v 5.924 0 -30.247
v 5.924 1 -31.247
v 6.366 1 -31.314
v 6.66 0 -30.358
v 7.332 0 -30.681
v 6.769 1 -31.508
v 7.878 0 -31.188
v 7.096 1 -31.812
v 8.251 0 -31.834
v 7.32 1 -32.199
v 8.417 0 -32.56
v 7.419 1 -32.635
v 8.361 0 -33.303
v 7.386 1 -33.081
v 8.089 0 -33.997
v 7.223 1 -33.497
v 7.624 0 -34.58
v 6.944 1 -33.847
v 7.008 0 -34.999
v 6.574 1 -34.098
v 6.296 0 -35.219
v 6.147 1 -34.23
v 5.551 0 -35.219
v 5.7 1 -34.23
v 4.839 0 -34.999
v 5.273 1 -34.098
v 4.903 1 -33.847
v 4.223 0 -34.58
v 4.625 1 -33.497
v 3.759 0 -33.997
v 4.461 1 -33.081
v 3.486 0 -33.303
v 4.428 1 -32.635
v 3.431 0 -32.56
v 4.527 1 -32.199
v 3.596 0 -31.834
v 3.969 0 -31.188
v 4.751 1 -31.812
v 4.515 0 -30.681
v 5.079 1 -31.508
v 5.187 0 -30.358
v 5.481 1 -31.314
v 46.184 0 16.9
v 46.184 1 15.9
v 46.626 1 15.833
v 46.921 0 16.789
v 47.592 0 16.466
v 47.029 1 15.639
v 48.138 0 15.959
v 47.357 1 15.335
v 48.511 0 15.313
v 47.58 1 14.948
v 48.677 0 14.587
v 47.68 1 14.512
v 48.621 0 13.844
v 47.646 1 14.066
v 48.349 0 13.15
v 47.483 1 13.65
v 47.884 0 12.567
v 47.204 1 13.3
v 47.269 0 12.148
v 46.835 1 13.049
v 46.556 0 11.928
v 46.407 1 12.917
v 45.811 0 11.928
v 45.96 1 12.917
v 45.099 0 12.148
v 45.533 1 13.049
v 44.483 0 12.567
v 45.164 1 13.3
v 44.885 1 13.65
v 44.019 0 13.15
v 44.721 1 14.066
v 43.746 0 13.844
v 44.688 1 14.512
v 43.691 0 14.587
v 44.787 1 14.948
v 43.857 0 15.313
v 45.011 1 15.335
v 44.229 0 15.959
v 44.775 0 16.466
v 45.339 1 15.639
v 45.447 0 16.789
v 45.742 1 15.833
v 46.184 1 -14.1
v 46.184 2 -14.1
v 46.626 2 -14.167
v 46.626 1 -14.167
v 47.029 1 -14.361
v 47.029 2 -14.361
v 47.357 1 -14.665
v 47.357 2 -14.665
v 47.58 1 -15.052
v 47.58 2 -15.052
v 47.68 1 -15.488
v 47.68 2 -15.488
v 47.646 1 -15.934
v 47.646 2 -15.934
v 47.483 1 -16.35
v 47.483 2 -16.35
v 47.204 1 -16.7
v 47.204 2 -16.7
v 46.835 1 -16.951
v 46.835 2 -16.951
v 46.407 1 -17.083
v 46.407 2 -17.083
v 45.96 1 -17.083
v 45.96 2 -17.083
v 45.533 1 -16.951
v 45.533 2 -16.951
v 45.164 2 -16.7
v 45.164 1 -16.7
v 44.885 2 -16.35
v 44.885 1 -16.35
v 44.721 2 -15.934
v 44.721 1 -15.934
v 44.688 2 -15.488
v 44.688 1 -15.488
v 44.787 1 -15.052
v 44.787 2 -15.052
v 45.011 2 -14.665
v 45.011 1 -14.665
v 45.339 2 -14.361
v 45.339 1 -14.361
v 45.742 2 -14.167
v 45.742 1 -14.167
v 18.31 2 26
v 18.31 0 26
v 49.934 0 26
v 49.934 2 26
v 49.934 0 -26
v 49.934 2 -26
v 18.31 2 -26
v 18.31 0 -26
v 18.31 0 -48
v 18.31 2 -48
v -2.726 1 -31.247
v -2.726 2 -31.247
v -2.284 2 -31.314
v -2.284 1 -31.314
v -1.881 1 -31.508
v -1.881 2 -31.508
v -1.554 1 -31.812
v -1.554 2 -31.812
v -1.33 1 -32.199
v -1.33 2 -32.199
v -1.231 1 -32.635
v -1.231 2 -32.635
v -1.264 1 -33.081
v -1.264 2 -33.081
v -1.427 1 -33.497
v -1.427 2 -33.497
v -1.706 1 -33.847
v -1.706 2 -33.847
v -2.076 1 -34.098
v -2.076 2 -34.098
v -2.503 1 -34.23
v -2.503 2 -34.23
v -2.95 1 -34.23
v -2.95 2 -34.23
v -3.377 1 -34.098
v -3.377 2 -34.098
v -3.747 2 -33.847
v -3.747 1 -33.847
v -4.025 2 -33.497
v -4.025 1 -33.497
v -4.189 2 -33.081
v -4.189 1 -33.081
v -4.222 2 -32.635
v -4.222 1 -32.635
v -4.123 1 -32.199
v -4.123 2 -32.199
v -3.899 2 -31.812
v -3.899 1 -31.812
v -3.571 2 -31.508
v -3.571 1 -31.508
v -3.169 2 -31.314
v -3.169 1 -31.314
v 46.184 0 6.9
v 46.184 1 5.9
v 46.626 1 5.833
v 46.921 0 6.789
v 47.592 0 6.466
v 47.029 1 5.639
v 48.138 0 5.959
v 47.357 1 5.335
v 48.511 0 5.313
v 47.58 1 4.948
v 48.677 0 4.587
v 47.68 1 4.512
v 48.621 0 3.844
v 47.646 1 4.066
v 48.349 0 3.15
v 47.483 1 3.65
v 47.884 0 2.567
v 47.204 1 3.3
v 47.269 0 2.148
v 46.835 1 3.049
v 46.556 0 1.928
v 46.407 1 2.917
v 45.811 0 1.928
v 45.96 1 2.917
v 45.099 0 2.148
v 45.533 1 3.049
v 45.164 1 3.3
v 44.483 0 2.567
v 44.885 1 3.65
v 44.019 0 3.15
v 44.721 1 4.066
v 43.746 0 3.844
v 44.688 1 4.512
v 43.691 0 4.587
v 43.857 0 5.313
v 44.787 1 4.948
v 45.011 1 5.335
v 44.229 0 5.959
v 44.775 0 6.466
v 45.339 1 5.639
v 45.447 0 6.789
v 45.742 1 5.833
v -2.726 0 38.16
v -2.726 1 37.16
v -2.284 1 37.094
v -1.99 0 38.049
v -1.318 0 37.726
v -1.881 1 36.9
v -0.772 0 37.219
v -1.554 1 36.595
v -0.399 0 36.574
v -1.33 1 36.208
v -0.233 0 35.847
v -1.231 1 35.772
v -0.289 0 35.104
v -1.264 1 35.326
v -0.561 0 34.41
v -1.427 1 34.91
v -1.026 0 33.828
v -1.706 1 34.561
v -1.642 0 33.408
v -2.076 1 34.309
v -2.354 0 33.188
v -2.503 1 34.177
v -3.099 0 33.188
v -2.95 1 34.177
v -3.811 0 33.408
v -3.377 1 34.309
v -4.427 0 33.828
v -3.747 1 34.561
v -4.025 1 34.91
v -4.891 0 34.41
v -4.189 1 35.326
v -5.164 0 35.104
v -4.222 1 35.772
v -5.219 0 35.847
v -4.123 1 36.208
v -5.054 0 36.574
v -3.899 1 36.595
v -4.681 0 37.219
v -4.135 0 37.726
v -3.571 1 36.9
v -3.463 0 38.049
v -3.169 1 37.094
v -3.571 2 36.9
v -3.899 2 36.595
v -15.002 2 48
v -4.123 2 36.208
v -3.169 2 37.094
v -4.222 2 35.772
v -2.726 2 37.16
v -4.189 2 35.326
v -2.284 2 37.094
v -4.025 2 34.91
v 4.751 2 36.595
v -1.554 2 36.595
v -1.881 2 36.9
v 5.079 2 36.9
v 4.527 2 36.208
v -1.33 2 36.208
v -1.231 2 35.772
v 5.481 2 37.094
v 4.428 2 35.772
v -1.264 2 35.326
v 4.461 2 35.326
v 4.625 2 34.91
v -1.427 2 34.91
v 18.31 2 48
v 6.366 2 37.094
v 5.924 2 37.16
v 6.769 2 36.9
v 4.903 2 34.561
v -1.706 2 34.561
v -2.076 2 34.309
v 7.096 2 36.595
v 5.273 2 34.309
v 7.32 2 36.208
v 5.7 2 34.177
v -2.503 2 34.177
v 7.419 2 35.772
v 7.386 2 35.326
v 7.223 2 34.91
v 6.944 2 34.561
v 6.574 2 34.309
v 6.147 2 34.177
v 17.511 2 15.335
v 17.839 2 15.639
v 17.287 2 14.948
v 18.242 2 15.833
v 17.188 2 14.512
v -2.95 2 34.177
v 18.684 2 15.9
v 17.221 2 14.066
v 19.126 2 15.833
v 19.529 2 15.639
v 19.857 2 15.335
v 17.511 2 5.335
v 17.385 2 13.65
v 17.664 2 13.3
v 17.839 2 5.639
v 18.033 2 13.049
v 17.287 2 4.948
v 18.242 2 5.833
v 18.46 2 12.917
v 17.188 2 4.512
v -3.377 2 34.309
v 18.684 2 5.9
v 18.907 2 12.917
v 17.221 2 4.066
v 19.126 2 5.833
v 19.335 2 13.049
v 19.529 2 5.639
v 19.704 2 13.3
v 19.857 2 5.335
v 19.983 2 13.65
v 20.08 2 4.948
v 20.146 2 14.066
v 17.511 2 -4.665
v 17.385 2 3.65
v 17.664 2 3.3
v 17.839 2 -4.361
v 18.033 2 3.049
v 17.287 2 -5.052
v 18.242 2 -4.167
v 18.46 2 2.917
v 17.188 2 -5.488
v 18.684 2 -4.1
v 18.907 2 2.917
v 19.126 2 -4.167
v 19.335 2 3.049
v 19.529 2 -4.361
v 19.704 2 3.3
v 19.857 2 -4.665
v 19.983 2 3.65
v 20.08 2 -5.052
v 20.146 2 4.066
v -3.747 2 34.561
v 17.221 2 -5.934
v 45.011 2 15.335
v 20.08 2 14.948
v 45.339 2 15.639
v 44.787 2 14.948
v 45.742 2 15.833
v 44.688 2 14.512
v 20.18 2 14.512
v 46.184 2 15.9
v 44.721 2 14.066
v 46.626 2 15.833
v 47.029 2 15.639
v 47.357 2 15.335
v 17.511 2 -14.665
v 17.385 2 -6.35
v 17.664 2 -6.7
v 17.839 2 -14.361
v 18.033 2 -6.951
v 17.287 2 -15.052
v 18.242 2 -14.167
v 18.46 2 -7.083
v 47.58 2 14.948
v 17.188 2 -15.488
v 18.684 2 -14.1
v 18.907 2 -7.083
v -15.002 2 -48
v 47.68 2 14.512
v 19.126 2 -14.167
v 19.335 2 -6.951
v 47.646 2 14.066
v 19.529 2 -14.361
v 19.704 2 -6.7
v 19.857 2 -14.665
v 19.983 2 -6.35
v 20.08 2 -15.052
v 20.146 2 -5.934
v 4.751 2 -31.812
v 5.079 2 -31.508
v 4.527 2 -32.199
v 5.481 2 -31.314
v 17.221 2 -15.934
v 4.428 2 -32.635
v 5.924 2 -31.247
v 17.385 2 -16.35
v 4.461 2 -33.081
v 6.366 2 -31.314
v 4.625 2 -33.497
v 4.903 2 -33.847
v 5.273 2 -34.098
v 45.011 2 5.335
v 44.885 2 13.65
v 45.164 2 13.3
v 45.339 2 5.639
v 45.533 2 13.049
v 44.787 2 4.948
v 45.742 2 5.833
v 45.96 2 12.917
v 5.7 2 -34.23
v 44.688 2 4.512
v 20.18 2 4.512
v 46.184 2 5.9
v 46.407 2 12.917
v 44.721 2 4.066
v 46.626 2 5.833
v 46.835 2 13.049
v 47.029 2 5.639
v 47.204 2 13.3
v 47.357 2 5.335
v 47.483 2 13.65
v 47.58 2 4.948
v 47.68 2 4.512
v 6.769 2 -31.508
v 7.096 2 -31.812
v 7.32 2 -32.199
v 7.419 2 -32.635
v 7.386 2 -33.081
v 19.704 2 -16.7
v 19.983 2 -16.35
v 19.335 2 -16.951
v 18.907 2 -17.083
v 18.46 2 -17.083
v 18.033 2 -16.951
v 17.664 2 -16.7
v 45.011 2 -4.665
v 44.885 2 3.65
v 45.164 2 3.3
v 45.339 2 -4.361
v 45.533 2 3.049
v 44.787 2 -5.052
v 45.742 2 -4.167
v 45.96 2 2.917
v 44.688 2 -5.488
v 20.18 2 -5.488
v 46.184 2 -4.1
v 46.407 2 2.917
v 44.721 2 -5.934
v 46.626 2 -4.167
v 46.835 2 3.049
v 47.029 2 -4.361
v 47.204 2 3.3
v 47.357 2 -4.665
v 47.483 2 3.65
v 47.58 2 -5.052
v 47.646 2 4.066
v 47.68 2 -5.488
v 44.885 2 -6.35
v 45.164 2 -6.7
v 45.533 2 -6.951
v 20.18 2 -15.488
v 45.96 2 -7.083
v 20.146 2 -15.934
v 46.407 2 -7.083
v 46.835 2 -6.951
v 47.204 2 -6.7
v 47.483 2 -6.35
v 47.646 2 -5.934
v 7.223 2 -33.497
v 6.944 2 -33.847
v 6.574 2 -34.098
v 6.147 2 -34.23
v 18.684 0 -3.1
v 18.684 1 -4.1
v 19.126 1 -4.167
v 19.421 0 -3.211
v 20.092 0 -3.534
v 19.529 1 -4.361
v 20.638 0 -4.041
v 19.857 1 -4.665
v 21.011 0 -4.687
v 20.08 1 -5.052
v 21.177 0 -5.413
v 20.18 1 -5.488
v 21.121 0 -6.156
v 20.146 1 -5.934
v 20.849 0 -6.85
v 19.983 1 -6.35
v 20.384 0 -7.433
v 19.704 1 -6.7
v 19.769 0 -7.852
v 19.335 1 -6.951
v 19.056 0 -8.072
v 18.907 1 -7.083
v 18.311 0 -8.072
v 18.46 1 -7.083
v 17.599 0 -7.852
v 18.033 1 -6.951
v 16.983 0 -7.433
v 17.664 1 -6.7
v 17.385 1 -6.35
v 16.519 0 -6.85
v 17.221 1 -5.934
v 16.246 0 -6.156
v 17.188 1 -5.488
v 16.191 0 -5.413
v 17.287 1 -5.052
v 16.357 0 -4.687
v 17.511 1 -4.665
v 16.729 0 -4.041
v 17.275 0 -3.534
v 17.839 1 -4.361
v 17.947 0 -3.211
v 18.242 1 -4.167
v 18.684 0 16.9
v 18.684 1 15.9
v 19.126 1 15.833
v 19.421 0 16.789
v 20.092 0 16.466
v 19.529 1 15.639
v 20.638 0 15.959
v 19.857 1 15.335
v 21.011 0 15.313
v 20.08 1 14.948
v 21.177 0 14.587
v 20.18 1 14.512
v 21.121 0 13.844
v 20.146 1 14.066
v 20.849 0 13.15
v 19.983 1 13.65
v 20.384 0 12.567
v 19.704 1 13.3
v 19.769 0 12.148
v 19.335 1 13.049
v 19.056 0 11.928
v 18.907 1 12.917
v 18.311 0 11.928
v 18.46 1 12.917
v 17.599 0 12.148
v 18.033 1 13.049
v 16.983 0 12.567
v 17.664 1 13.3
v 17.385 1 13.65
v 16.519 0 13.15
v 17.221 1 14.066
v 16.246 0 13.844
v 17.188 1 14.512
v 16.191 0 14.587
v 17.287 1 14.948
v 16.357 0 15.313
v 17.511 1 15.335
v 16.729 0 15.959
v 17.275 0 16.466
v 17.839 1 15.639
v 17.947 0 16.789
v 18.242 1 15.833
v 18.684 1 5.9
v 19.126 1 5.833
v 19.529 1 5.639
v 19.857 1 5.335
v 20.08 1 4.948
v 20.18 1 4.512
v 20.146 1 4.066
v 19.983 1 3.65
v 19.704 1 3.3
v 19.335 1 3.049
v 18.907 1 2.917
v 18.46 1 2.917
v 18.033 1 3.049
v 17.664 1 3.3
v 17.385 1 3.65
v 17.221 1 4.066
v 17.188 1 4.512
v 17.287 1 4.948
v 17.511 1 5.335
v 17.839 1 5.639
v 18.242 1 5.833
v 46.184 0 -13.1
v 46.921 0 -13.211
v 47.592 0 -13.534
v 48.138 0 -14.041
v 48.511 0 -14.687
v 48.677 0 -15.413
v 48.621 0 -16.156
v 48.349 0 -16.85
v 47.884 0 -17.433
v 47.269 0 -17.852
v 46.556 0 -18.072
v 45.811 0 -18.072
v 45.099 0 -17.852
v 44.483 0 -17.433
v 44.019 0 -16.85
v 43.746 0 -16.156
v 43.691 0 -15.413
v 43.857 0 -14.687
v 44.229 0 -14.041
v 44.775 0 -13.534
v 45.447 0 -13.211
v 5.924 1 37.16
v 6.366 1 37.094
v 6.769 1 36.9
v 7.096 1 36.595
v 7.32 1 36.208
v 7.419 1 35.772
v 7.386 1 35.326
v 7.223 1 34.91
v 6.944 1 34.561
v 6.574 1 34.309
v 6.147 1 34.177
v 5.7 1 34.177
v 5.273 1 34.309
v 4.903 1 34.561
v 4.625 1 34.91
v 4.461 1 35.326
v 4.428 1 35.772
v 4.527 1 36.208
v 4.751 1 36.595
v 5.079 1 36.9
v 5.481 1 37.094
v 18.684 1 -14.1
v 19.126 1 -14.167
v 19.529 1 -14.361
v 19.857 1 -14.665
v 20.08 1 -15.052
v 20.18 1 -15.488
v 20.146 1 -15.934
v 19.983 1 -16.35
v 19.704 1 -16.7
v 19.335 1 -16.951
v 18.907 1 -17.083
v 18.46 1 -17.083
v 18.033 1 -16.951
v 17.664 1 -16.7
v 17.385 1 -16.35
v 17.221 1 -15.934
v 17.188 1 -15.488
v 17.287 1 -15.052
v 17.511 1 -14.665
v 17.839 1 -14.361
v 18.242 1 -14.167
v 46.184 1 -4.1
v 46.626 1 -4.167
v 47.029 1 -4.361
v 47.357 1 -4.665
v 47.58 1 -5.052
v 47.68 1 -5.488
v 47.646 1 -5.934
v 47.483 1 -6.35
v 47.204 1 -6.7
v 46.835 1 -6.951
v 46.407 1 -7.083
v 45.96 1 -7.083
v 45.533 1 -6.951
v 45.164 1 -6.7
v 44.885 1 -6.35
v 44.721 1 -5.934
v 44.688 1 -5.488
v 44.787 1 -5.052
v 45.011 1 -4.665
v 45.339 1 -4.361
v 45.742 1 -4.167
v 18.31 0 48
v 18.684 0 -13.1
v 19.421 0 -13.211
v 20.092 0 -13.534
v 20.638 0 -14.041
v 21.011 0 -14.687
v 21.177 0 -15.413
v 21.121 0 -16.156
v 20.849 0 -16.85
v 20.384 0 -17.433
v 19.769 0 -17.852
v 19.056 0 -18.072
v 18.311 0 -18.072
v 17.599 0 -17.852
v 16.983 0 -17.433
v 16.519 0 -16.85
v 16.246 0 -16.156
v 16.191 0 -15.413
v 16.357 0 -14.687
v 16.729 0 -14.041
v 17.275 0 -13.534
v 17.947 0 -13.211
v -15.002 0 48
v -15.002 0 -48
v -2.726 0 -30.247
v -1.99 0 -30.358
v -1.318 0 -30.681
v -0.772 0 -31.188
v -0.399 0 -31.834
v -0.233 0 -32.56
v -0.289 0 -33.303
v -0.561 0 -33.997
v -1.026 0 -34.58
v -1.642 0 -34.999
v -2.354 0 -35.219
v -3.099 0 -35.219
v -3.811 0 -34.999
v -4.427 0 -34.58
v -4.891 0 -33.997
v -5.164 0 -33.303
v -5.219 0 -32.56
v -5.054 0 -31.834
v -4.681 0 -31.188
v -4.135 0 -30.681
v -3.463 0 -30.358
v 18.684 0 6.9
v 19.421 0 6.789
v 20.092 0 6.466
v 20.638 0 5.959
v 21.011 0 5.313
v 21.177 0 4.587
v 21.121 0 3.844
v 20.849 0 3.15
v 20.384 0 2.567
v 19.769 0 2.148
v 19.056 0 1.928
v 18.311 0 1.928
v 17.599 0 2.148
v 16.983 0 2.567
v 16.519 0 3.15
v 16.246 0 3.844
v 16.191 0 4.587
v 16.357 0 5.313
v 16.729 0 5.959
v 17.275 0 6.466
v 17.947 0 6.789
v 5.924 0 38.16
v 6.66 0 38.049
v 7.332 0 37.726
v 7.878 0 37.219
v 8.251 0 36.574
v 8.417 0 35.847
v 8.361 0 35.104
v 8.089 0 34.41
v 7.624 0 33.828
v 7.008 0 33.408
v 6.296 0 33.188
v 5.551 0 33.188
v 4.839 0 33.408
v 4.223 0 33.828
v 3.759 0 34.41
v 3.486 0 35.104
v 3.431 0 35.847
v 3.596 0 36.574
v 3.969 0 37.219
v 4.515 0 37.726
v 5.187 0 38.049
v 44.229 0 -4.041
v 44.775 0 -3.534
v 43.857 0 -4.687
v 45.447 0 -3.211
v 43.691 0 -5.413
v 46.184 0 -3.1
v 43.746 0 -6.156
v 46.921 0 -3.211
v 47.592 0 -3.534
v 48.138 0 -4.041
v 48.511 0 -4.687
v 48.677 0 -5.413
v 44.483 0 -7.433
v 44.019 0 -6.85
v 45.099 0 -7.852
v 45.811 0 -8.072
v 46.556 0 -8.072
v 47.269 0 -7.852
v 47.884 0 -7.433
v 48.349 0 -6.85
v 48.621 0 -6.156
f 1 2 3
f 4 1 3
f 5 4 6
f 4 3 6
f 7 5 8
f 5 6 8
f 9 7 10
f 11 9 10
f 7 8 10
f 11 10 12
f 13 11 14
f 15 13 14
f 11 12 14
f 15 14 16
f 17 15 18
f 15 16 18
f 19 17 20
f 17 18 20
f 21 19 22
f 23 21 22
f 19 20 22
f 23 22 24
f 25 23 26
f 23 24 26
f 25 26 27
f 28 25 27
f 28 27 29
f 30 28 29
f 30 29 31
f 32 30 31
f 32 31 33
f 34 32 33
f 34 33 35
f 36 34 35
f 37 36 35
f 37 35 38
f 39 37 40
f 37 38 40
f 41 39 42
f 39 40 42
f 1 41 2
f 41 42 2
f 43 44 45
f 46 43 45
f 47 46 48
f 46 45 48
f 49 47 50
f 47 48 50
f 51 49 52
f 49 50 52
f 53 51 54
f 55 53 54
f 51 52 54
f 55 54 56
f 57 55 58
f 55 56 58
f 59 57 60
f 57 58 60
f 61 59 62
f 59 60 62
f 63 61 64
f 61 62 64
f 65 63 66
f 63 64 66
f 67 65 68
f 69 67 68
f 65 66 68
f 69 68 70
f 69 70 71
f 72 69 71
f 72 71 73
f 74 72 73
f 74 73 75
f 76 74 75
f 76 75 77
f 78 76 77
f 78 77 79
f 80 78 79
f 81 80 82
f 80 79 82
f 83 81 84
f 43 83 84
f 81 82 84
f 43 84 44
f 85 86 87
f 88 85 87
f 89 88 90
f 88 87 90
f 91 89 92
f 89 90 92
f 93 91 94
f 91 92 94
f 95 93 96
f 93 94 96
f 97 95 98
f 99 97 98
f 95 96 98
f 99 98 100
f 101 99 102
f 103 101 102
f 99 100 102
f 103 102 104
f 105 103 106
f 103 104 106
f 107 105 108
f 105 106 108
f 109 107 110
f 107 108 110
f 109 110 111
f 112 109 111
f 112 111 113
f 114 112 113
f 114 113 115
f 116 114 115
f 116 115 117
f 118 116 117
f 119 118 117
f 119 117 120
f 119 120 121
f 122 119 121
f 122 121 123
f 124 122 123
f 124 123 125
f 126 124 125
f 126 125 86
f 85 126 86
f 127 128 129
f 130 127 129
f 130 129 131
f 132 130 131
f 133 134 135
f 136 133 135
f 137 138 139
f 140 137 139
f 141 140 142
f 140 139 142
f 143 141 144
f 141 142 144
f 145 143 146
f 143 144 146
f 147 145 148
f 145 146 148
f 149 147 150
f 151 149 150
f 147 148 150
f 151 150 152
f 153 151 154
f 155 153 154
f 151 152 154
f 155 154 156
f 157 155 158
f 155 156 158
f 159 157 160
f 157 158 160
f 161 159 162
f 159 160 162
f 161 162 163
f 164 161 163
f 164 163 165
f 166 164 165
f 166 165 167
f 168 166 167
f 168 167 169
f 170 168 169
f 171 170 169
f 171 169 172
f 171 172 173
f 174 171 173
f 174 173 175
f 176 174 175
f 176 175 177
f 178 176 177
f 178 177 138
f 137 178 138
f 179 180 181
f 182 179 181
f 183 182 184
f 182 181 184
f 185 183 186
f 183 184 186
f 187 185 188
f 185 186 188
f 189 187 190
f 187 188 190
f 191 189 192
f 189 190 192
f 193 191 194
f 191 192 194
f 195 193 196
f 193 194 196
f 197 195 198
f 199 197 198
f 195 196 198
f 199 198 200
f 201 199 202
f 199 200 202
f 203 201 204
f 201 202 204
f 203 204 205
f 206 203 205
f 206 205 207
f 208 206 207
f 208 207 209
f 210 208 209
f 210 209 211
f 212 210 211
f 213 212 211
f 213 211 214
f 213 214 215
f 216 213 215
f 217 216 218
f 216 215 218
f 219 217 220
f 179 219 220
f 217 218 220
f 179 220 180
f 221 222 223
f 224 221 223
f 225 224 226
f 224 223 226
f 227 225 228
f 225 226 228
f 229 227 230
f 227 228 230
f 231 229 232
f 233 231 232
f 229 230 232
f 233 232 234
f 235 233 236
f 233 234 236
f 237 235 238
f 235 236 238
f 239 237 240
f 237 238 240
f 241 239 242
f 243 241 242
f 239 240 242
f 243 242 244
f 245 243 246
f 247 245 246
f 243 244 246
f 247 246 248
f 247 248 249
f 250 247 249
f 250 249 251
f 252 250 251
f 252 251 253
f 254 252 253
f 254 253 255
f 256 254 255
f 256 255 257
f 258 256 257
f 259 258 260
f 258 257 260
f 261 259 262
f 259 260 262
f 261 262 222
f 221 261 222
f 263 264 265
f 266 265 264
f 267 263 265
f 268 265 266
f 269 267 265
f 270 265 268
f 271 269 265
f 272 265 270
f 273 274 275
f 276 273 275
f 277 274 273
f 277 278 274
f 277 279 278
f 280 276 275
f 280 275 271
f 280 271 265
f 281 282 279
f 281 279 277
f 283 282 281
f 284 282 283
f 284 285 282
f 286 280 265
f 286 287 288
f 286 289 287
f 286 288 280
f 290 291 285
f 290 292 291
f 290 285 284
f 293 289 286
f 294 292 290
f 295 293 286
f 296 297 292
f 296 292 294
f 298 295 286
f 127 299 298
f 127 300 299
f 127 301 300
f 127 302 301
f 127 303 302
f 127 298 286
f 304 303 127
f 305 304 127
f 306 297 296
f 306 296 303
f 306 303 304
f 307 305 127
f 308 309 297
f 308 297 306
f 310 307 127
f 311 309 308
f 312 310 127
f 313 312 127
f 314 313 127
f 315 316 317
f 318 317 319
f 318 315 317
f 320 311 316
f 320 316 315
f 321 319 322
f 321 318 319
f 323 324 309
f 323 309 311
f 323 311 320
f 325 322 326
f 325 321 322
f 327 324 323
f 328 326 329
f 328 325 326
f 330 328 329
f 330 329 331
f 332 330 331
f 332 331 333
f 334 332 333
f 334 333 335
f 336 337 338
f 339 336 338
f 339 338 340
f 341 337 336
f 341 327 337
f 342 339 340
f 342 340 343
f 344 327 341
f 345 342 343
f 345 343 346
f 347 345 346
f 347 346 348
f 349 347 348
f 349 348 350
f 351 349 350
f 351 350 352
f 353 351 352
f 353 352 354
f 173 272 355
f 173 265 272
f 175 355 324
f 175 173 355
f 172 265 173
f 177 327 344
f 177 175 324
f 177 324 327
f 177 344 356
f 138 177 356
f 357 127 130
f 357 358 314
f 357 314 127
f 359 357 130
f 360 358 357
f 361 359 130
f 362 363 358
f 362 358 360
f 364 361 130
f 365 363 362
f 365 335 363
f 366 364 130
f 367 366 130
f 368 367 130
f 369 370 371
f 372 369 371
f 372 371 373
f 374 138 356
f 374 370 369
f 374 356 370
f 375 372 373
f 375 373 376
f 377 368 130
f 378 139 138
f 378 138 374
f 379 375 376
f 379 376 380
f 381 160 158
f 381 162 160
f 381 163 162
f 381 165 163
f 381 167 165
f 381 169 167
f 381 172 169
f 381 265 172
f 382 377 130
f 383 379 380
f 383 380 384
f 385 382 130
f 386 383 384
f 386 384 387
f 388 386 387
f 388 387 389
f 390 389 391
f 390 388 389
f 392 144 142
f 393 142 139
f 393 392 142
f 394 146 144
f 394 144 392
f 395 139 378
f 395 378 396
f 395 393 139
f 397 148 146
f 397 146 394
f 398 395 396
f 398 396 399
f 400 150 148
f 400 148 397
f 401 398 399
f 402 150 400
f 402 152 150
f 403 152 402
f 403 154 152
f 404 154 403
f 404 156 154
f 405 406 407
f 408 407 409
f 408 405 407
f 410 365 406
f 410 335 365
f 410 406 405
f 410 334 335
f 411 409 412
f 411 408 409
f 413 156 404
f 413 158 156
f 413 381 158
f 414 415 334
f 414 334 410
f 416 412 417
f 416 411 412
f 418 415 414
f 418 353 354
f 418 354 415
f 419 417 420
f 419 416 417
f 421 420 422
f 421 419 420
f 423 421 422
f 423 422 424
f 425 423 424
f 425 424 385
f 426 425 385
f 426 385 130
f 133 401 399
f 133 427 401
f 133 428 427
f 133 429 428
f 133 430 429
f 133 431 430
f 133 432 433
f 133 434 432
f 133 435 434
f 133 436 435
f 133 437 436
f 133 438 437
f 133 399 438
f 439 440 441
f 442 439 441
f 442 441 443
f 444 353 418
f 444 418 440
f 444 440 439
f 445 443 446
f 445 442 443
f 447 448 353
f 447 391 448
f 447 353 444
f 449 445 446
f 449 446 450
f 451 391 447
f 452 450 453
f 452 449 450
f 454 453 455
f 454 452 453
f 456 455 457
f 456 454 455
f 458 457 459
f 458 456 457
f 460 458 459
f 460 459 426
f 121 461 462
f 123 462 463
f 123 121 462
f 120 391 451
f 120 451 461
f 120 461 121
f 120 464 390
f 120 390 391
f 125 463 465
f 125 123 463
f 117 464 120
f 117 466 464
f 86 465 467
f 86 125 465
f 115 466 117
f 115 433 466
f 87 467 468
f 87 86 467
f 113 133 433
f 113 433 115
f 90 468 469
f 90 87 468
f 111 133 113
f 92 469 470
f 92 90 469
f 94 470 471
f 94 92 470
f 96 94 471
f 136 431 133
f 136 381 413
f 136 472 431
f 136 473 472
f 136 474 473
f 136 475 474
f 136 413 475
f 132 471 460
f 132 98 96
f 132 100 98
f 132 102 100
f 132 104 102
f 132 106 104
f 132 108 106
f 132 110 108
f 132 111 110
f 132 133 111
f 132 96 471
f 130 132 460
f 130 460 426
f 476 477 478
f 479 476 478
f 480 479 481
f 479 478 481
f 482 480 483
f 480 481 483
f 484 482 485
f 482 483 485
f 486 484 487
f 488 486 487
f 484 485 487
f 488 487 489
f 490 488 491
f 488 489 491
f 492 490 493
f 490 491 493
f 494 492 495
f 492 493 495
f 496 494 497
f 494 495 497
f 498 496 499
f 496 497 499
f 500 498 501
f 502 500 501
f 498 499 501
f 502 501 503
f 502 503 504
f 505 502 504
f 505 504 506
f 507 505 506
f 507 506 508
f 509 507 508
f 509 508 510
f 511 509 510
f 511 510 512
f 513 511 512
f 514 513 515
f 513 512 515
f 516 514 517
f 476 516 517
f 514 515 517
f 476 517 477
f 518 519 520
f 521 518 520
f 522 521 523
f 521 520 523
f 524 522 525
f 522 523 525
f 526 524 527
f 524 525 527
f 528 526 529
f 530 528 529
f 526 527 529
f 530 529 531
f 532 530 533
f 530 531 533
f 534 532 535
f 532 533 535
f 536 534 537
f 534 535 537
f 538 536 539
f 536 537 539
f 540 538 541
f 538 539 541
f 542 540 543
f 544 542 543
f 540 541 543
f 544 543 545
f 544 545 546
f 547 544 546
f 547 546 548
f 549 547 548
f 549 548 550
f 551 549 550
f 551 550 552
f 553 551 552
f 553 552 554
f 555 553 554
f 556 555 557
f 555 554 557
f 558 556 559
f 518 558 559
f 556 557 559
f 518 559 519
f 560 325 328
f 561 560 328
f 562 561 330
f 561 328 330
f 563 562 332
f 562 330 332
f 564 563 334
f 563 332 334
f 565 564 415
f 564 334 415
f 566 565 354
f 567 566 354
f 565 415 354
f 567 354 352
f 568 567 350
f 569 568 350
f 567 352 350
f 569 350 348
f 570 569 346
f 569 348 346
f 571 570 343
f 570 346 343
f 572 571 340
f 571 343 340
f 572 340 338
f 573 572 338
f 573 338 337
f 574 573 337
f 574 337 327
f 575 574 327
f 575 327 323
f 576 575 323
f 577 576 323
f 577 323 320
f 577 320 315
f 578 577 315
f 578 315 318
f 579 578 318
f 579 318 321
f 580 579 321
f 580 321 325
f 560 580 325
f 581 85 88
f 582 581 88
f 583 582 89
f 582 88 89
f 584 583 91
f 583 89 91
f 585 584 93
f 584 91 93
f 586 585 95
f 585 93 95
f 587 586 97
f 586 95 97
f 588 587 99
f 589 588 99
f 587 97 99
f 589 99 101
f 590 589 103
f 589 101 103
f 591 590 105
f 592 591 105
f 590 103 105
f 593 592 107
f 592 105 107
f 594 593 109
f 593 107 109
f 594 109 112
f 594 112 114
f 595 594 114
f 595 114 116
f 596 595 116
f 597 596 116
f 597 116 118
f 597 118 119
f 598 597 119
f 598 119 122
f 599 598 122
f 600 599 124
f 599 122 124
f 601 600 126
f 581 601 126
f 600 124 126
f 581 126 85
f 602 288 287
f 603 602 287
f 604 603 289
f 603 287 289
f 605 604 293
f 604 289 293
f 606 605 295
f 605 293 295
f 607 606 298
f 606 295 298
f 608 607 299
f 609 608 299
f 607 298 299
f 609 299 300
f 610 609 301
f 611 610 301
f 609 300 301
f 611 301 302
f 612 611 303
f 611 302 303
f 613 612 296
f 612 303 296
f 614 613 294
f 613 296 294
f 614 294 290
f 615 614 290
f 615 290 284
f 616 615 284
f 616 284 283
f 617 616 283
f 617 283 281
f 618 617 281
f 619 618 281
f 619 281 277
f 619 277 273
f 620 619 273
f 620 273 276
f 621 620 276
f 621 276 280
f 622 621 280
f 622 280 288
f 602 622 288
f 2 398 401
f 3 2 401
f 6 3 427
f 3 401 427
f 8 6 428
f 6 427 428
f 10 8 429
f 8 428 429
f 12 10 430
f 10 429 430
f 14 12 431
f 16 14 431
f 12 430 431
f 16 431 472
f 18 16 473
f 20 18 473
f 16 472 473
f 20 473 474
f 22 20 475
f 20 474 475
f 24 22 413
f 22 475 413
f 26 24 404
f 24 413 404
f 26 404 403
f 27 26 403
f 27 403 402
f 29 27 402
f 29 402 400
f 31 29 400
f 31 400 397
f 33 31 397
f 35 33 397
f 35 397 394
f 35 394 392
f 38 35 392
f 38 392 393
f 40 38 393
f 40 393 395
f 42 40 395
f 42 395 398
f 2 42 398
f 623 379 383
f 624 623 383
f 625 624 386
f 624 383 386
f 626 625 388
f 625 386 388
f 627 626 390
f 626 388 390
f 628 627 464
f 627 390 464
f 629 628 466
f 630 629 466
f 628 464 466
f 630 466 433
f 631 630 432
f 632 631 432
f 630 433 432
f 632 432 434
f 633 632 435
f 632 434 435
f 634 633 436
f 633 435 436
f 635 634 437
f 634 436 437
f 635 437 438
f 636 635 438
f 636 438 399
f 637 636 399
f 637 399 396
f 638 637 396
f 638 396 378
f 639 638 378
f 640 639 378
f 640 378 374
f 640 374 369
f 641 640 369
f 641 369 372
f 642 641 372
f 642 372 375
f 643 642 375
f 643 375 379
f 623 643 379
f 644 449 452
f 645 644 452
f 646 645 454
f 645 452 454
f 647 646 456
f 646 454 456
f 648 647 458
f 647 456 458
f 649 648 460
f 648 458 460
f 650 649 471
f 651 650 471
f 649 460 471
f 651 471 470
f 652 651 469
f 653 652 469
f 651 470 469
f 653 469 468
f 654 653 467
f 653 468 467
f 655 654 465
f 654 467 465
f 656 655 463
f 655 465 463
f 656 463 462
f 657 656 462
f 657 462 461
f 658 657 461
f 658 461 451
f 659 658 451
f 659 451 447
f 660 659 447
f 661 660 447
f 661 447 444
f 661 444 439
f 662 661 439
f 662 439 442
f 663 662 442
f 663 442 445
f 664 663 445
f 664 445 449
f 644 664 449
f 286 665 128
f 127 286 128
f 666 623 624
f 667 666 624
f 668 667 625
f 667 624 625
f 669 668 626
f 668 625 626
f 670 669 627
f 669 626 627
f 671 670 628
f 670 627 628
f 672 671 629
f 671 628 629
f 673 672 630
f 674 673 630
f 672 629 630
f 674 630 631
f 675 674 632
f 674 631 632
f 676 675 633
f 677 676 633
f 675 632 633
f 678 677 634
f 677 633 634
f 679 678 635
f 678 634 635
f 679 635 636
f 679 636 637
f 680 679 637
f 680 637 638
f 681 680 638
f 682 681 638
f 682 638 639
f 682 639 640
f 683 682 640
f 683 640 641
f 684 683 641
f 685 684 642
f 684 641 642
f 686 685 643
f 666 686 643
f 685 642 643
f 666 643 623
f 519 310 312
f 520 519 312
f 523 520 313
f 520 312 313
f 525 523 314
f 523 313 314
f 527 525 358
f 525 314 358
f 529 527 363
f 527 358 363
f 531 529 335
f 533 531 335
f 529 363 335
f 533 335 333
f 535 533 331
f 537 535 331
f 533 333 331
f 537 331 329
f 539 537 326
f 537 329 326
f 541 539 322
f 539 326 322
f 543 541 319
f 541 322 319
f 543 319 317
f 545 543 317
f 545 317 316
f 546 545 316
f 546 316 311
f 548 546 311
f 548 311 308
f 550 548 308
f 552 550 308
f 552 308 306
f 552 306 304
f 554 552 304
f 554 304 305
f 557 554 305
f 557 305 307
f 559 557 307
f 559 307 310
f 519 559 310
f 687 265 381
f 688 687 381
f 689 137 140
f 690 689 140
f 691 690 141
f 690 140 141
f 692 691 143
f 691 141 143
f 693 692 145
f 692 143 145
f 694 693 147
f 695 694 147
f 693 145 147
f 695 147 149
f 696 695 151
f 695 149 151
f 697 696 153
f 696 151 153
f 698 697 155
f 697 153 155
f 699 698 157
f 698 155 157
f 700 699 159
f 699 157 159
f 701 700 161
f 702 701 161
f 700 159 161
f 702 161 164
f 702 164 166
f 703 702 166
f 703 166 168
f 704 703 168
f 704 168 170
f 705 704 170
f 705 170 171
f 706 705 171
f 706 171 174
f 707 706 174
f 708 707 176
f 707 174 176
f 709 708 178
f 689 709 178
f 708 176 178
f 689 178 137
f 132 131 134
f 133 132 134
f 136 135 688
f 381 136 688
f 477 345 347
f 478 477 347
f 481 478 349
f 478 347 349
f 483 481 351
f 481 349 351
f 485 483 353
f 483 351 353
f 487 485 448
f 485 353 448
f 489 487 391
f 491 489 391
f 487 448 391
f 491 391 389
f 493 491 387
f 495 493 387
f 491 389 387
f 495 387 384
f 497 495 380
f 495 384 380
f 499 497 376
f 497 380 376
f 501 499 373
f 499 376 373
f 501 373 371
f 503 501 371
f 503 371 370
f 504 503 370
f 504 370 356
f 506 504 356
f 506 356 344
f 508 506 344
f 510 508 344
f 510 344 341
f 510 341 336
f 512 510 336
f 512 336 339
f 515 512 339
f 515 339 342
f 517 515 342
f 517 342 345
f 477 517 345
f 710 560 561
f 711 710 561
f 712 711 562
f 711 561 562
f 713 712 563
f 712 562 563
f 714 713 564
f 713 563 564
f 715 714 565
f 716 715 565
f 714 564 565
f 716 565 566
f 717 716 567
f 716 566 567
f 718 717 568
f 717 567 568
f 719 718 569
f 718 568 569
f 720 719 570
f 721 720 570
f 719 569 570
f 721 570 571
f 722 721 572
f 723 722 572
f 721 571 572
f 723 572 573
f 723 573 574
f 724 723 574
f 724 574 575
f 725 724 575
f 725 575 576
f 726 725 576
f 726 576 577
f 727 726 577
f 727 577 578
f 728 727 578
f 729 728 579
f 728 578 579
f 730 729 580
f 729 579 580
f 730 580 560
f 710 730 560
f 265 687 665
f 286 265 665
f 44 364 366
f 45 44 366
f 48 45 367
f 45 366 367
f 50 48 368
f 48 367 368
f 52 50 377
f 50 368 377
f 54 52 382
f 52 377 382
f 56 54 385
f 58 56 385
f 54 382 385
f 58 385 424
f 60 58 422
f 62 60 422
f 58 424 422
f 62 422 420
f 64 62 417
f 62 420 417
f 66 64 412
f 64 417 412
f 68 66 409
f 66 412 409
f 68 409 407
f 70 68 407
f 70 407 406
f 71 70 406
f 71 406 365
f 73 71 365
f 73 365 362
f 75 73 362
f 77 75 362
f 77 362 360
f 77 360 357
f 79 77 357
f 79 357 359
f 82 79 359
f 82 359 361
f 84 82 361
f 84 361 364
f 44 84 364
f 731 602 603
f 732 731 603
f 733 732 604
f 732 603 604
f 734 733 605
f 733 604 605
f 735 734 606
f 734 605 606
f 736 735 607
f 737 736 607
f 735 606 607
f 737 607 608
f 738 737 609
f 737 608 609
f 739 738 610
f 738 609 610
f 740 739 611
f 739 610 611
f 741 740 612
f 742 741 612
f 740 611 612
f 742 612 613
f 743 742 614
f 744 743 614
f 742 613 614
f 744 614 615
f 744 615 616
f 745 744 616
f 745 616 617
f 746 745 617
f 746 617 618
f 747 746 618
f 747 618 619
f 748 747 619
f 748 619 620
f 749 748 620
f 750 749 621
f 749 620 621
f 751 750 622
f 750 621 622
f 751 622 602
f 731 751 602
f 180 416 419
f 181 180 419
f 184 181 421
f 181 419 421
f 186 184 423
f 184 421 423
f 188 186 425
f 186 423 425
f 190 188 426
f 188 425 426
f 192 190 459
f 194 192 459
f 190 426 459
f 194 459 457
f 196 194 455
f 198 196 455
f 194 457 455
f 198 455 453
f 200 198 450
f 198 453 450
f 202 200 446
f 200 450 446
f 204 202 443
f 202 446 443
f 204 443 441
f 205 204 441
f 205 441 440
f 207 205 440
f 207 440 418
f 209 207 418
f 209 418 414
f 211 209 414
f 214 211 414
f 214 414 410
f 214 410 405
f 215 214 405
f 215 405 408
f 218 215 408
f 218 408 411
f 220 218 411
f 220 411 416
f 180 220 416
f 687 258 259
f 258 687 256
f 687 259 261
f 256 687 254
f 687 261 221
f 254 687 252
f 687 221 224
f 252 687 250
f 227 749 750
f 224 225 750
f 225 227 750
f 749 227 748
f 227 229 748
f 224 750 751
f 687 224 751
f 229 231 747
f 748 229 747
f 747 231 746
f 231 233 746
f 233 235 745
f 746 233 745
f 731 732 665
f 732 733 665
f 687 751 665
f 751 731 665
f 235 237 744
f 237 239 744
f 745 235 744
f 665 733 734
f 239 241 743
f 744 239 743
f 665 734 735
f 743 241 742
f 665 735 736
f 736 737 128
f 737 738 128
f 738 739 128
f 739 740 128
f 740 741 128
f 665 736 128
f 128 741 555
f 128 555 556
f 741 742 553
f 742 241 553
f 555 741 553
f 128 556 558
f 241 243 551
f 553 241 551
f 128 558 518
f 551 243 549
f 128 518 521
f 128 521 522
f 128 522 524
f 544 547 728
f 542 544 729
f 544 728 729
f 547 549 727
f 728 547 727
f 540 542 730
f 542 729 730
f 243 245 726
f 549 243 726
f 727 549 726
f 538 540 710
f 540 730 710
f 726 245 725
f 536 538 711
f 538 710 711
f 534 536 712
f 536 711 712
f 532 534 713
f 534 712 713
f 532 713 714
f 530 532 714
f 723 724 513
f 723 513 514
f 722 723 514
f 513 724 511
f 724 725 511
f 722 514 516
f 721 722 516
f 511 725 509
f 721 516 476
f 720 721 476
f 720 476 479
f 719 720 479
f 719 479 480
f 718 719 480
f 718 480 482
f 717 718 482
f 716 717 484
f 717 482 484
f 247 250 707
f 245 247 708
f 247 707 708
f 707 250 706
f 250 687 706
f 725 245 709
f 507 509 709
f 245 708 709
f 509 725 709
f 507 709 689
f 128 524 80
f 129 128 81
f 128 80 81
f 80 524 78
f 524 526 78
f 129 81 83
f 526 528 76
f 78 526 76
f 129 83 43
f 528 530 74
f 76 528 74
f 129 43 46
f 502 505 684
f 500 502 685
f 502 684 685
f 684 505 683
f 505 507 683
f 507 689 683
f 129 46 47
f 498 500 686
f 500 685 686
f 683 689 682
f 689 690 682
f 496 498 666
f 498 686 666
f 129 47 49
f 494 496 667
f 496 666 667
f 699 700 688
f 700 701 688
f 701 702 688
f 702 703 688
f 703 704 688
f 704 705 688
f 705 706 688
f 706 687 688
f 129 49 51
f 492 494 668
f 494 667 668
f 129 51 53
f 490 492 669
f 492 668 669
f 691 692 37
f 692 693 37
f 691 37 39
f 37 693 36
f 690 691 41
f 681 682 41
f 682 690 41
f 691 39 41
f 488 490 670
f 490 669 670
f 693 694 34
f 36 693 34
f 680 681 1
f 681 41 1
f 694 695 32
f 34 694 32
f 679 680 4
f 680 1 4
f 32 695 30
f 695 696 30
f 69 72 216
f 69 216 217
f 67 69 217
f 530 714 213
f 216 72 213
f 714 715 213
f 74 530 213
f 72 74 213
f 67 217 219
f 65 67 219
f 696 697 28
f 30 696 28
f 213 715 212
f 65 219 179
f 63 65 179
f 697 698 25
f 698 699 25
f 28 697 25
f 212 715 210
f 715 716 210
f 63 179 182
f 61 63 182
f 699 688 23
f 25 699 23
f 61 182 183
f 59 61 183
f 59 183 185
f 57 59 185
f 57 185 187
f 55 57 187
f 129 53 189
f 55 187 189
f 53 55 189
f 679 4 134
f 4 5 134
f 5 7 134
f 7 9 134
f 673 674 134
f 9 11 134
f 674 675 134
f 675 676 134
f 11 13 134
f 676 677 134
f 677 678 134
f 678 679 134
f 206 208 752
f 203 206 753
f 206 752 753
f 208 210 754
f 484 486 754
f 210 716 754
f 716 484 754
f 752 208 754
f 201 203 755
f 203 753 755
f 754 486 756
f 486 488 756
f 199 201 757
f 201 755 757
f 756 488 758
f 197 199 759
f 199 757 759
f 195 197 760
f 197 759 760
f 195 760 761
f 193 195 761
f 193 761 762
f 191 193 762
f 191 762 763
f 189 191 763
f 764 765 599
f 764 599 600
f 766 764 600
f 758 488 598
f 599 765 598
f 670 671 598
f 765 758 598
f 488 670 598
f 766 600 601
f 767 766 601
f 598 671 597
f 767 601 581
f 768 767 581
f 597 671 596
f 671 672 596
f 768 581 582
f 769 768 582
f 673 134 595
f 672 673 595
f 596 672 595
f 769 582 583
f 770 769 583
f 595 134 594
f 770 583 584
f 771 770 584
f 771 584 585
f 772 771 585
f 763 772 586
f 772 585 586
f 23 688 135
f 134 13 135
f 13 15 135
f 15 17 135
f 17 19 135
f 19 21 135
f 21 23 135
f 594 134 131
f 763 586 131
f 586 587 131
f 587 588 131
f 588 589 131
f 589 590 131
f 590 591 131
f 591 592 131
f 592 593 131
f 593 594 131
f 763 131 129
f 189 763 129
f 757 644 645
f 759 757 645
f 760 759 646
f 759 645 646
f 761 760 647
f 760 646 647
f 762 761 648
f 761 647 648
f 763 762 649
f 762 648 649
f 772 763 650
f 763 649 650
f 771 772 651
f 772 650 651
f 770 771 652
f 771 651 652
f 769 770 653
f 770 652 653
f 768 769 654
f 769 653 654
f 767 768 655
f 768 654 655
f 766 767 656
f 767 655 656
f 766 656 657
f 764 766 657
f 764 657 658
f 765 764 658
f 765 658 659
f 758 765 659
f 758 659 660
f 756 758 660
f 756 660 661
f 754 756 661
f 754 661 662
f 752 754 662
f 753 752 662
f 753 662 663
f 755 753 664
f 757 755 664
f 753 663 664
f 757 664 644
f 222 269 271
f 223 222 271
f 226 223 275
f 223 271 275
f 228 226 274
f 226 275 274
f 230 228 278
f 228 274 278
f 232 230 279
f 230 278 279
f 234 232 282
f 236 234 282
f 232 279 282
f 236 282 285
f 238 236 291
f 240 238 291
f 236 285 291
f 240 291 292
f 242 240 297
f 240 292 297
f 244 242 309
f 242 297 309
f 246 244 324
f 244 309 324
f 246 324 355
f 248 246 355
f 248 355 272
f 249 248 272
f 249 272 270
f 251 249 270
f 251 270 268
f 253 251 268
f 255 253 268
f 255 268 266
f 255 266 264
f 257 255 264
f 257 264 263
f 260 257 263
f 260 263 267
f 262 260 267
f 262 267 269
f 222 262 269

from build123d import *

# Parameters (mm, degrees)
SKETCH_1_W          = 17.893001423
SKETCH_1_H          = 11.620982588
SKETCH_1_H_2        = 11.620982589
EXTRUDE_1_DEPTH     = 2
SKETCH_2_R          = 1.5
CUT_EXTRUDE_1_DEPTH = 10
CHAMFER_1_SIZE      = 1
SKETCH_3_R          = 1.5
CUT_EXTRUDE_2_DEPTH = 10
SKETCH_4_W          = 33.95700602
SKETCH_4_H          = 96
CUT_EXTRUDE_3_DEPTH = 10
CHAMFER_2_SIZE      = 1


with BuildPart() as part:
    # Эскиз1 → Бобышка-Вытянуть1 (new body)
    with BuildSketch(Plane(origin=(0, 0, 0), x_dir=(1, 0, 0), z_dir=(0, 1, 0))):
        Polygon((49.933797981, 26), (18.309932441, 26), (18.309932441, 48), (15, 48), (-48.959081244, 48), (-48.959081244, -48), (15, -48), (18.309932441, -48), (18.309932441, -26), (49.933797981, -26), align=None)
        with Locations((-36.319088007, -31.12001489)):
            Rectangle(SKETCH_1_W, SKETCH_1_H, mode=Mode.SUBTRACT)
        with Locations((-36.319088007, 31.12001489)):
            Rectangle(SKETCH_1_W, SKETCH_1_H_2, mode=Mode.SUBTRACT)
    extrude(amount=EXTRUDE_1_DEPTH)

    # Эскиз2 → Вырез-Вытянуть1 (cut)
    with BuildSketch(Plane(origin=(0, 2, 0), x_dir=(1, 0, 0), z_dir=(0, 1, 0))):
        with Locations(Location((46.183797981, -14.4, 0), (0, 0, 270))):
            Circle(SKETCH_2_R)
        with Locations(Location((18.683797981, -14.4, 0), (0, 0, 270))):
            Circle(SKETCH_2_R)
        with Locations(Location((18.683797981, -4.4, 0), (0, 0, 270))):
            Circle(SKETCH_2_R)
        with Locations(Location((46.183797981, -4.4, 0), (0, 0, 270))):
            Circle(SKETCH_2_R)
        with Locations(Location((18.683797981, 5.6, 0), (0, 0, 270))):
            Circle(SKETCH_2_R)
        with Locations(Location((46.183797981, 5.6, 0), (0, 0, 270))):
            Circle(SKETCH_2_R)
        with Locations(Location((18.683797981, 15.6, 0), (0, 0, 270))):
            Circle(SKETCH_2_R)
        with Locations(Location((46.183797981, 15.6, 0), (0, 0, 270))):
            Circle(SKETCH_2_R)
    extrude(amount=-CUT_EXTRUDE_1_DEPTH, mode=Mode.SUBTRACT)

    # Фаска1
    chamfer_1_edges = [part.edges().sort_by_distance(p)[0] for p in [
        (46.183797981, 0, -7.1),
        (18.683797981, 0, 2.9),
        (46.183797981, 0, 2.9),
        (18.683797981, 0, 12.9),
        (18.683797981, 0, -17.1),
        (46.183797981, 0, -17.1),
        (18.683797981, 0, -7.1),
        (46.183797981, 0, 12.9),
    ]]
    chamfer(chamfer_1_edges, length=CHAMFER_1_SIZE)

    # Эскиз3 → Вырез-Вытянуть2 (cut)
    with BuildSketch(Plane(origin=(0, 2, 0), x_dir=(1, 0, 0), z_dir=(0, 1, 0))):
        with Locations(Location((5.923569009, 32.746976788, 0), (0, 0, 270))):
            Circle(SKETCH_3_R)
        with Locations(Location((-2.726430991, 32.746976788, 0), (0, 0, 270))):
            Circle(SKETCH_3_R)
        with Locations(Location((-2.726430991, -35.660220789, 0), (0, 0, 270))):
            Circle(SKETCH_3_R)
        with Locations(Location((5.923569009, -35.660220789, 0), (0, 0, 270))):
            Circle(SKETCH_3_R)
    extrude(amount=-CUT_EXTRUDE_2_DEPTH, mode=Mode.SUBTRACT)

    # Эскиз4 → Вырез-Вытянуть3 (cut)
    with BuildSketch(Plane(origin=(0, 2, 0), x_dir=(1, 0, 0), z_dir=(0, 1, 0))):
        with Locations((-31.980578234, 0)):
            Rectangle(SKETCH_4_W, SKETCH_4_H)
    extrude(amount=-CUT_EXTRUDE_3_DEPTH, mode=Mode.SUBTRACT)

    # Фаска2
    chamfer_2_edges = [part.edges().sort_by_distance(p)[0] for p in [
        (5.923569009, 0, 34.160220789),
        (-2.726430991, 0, 34.160220789),
        (-2.726430991, 0, -34.246976788),
        (5.923569009, 0, -34.246976788),
    ]]
    chamfer(chamfer_2_edges, length=CHAMFER_2_SIZE)


solid = part.part
